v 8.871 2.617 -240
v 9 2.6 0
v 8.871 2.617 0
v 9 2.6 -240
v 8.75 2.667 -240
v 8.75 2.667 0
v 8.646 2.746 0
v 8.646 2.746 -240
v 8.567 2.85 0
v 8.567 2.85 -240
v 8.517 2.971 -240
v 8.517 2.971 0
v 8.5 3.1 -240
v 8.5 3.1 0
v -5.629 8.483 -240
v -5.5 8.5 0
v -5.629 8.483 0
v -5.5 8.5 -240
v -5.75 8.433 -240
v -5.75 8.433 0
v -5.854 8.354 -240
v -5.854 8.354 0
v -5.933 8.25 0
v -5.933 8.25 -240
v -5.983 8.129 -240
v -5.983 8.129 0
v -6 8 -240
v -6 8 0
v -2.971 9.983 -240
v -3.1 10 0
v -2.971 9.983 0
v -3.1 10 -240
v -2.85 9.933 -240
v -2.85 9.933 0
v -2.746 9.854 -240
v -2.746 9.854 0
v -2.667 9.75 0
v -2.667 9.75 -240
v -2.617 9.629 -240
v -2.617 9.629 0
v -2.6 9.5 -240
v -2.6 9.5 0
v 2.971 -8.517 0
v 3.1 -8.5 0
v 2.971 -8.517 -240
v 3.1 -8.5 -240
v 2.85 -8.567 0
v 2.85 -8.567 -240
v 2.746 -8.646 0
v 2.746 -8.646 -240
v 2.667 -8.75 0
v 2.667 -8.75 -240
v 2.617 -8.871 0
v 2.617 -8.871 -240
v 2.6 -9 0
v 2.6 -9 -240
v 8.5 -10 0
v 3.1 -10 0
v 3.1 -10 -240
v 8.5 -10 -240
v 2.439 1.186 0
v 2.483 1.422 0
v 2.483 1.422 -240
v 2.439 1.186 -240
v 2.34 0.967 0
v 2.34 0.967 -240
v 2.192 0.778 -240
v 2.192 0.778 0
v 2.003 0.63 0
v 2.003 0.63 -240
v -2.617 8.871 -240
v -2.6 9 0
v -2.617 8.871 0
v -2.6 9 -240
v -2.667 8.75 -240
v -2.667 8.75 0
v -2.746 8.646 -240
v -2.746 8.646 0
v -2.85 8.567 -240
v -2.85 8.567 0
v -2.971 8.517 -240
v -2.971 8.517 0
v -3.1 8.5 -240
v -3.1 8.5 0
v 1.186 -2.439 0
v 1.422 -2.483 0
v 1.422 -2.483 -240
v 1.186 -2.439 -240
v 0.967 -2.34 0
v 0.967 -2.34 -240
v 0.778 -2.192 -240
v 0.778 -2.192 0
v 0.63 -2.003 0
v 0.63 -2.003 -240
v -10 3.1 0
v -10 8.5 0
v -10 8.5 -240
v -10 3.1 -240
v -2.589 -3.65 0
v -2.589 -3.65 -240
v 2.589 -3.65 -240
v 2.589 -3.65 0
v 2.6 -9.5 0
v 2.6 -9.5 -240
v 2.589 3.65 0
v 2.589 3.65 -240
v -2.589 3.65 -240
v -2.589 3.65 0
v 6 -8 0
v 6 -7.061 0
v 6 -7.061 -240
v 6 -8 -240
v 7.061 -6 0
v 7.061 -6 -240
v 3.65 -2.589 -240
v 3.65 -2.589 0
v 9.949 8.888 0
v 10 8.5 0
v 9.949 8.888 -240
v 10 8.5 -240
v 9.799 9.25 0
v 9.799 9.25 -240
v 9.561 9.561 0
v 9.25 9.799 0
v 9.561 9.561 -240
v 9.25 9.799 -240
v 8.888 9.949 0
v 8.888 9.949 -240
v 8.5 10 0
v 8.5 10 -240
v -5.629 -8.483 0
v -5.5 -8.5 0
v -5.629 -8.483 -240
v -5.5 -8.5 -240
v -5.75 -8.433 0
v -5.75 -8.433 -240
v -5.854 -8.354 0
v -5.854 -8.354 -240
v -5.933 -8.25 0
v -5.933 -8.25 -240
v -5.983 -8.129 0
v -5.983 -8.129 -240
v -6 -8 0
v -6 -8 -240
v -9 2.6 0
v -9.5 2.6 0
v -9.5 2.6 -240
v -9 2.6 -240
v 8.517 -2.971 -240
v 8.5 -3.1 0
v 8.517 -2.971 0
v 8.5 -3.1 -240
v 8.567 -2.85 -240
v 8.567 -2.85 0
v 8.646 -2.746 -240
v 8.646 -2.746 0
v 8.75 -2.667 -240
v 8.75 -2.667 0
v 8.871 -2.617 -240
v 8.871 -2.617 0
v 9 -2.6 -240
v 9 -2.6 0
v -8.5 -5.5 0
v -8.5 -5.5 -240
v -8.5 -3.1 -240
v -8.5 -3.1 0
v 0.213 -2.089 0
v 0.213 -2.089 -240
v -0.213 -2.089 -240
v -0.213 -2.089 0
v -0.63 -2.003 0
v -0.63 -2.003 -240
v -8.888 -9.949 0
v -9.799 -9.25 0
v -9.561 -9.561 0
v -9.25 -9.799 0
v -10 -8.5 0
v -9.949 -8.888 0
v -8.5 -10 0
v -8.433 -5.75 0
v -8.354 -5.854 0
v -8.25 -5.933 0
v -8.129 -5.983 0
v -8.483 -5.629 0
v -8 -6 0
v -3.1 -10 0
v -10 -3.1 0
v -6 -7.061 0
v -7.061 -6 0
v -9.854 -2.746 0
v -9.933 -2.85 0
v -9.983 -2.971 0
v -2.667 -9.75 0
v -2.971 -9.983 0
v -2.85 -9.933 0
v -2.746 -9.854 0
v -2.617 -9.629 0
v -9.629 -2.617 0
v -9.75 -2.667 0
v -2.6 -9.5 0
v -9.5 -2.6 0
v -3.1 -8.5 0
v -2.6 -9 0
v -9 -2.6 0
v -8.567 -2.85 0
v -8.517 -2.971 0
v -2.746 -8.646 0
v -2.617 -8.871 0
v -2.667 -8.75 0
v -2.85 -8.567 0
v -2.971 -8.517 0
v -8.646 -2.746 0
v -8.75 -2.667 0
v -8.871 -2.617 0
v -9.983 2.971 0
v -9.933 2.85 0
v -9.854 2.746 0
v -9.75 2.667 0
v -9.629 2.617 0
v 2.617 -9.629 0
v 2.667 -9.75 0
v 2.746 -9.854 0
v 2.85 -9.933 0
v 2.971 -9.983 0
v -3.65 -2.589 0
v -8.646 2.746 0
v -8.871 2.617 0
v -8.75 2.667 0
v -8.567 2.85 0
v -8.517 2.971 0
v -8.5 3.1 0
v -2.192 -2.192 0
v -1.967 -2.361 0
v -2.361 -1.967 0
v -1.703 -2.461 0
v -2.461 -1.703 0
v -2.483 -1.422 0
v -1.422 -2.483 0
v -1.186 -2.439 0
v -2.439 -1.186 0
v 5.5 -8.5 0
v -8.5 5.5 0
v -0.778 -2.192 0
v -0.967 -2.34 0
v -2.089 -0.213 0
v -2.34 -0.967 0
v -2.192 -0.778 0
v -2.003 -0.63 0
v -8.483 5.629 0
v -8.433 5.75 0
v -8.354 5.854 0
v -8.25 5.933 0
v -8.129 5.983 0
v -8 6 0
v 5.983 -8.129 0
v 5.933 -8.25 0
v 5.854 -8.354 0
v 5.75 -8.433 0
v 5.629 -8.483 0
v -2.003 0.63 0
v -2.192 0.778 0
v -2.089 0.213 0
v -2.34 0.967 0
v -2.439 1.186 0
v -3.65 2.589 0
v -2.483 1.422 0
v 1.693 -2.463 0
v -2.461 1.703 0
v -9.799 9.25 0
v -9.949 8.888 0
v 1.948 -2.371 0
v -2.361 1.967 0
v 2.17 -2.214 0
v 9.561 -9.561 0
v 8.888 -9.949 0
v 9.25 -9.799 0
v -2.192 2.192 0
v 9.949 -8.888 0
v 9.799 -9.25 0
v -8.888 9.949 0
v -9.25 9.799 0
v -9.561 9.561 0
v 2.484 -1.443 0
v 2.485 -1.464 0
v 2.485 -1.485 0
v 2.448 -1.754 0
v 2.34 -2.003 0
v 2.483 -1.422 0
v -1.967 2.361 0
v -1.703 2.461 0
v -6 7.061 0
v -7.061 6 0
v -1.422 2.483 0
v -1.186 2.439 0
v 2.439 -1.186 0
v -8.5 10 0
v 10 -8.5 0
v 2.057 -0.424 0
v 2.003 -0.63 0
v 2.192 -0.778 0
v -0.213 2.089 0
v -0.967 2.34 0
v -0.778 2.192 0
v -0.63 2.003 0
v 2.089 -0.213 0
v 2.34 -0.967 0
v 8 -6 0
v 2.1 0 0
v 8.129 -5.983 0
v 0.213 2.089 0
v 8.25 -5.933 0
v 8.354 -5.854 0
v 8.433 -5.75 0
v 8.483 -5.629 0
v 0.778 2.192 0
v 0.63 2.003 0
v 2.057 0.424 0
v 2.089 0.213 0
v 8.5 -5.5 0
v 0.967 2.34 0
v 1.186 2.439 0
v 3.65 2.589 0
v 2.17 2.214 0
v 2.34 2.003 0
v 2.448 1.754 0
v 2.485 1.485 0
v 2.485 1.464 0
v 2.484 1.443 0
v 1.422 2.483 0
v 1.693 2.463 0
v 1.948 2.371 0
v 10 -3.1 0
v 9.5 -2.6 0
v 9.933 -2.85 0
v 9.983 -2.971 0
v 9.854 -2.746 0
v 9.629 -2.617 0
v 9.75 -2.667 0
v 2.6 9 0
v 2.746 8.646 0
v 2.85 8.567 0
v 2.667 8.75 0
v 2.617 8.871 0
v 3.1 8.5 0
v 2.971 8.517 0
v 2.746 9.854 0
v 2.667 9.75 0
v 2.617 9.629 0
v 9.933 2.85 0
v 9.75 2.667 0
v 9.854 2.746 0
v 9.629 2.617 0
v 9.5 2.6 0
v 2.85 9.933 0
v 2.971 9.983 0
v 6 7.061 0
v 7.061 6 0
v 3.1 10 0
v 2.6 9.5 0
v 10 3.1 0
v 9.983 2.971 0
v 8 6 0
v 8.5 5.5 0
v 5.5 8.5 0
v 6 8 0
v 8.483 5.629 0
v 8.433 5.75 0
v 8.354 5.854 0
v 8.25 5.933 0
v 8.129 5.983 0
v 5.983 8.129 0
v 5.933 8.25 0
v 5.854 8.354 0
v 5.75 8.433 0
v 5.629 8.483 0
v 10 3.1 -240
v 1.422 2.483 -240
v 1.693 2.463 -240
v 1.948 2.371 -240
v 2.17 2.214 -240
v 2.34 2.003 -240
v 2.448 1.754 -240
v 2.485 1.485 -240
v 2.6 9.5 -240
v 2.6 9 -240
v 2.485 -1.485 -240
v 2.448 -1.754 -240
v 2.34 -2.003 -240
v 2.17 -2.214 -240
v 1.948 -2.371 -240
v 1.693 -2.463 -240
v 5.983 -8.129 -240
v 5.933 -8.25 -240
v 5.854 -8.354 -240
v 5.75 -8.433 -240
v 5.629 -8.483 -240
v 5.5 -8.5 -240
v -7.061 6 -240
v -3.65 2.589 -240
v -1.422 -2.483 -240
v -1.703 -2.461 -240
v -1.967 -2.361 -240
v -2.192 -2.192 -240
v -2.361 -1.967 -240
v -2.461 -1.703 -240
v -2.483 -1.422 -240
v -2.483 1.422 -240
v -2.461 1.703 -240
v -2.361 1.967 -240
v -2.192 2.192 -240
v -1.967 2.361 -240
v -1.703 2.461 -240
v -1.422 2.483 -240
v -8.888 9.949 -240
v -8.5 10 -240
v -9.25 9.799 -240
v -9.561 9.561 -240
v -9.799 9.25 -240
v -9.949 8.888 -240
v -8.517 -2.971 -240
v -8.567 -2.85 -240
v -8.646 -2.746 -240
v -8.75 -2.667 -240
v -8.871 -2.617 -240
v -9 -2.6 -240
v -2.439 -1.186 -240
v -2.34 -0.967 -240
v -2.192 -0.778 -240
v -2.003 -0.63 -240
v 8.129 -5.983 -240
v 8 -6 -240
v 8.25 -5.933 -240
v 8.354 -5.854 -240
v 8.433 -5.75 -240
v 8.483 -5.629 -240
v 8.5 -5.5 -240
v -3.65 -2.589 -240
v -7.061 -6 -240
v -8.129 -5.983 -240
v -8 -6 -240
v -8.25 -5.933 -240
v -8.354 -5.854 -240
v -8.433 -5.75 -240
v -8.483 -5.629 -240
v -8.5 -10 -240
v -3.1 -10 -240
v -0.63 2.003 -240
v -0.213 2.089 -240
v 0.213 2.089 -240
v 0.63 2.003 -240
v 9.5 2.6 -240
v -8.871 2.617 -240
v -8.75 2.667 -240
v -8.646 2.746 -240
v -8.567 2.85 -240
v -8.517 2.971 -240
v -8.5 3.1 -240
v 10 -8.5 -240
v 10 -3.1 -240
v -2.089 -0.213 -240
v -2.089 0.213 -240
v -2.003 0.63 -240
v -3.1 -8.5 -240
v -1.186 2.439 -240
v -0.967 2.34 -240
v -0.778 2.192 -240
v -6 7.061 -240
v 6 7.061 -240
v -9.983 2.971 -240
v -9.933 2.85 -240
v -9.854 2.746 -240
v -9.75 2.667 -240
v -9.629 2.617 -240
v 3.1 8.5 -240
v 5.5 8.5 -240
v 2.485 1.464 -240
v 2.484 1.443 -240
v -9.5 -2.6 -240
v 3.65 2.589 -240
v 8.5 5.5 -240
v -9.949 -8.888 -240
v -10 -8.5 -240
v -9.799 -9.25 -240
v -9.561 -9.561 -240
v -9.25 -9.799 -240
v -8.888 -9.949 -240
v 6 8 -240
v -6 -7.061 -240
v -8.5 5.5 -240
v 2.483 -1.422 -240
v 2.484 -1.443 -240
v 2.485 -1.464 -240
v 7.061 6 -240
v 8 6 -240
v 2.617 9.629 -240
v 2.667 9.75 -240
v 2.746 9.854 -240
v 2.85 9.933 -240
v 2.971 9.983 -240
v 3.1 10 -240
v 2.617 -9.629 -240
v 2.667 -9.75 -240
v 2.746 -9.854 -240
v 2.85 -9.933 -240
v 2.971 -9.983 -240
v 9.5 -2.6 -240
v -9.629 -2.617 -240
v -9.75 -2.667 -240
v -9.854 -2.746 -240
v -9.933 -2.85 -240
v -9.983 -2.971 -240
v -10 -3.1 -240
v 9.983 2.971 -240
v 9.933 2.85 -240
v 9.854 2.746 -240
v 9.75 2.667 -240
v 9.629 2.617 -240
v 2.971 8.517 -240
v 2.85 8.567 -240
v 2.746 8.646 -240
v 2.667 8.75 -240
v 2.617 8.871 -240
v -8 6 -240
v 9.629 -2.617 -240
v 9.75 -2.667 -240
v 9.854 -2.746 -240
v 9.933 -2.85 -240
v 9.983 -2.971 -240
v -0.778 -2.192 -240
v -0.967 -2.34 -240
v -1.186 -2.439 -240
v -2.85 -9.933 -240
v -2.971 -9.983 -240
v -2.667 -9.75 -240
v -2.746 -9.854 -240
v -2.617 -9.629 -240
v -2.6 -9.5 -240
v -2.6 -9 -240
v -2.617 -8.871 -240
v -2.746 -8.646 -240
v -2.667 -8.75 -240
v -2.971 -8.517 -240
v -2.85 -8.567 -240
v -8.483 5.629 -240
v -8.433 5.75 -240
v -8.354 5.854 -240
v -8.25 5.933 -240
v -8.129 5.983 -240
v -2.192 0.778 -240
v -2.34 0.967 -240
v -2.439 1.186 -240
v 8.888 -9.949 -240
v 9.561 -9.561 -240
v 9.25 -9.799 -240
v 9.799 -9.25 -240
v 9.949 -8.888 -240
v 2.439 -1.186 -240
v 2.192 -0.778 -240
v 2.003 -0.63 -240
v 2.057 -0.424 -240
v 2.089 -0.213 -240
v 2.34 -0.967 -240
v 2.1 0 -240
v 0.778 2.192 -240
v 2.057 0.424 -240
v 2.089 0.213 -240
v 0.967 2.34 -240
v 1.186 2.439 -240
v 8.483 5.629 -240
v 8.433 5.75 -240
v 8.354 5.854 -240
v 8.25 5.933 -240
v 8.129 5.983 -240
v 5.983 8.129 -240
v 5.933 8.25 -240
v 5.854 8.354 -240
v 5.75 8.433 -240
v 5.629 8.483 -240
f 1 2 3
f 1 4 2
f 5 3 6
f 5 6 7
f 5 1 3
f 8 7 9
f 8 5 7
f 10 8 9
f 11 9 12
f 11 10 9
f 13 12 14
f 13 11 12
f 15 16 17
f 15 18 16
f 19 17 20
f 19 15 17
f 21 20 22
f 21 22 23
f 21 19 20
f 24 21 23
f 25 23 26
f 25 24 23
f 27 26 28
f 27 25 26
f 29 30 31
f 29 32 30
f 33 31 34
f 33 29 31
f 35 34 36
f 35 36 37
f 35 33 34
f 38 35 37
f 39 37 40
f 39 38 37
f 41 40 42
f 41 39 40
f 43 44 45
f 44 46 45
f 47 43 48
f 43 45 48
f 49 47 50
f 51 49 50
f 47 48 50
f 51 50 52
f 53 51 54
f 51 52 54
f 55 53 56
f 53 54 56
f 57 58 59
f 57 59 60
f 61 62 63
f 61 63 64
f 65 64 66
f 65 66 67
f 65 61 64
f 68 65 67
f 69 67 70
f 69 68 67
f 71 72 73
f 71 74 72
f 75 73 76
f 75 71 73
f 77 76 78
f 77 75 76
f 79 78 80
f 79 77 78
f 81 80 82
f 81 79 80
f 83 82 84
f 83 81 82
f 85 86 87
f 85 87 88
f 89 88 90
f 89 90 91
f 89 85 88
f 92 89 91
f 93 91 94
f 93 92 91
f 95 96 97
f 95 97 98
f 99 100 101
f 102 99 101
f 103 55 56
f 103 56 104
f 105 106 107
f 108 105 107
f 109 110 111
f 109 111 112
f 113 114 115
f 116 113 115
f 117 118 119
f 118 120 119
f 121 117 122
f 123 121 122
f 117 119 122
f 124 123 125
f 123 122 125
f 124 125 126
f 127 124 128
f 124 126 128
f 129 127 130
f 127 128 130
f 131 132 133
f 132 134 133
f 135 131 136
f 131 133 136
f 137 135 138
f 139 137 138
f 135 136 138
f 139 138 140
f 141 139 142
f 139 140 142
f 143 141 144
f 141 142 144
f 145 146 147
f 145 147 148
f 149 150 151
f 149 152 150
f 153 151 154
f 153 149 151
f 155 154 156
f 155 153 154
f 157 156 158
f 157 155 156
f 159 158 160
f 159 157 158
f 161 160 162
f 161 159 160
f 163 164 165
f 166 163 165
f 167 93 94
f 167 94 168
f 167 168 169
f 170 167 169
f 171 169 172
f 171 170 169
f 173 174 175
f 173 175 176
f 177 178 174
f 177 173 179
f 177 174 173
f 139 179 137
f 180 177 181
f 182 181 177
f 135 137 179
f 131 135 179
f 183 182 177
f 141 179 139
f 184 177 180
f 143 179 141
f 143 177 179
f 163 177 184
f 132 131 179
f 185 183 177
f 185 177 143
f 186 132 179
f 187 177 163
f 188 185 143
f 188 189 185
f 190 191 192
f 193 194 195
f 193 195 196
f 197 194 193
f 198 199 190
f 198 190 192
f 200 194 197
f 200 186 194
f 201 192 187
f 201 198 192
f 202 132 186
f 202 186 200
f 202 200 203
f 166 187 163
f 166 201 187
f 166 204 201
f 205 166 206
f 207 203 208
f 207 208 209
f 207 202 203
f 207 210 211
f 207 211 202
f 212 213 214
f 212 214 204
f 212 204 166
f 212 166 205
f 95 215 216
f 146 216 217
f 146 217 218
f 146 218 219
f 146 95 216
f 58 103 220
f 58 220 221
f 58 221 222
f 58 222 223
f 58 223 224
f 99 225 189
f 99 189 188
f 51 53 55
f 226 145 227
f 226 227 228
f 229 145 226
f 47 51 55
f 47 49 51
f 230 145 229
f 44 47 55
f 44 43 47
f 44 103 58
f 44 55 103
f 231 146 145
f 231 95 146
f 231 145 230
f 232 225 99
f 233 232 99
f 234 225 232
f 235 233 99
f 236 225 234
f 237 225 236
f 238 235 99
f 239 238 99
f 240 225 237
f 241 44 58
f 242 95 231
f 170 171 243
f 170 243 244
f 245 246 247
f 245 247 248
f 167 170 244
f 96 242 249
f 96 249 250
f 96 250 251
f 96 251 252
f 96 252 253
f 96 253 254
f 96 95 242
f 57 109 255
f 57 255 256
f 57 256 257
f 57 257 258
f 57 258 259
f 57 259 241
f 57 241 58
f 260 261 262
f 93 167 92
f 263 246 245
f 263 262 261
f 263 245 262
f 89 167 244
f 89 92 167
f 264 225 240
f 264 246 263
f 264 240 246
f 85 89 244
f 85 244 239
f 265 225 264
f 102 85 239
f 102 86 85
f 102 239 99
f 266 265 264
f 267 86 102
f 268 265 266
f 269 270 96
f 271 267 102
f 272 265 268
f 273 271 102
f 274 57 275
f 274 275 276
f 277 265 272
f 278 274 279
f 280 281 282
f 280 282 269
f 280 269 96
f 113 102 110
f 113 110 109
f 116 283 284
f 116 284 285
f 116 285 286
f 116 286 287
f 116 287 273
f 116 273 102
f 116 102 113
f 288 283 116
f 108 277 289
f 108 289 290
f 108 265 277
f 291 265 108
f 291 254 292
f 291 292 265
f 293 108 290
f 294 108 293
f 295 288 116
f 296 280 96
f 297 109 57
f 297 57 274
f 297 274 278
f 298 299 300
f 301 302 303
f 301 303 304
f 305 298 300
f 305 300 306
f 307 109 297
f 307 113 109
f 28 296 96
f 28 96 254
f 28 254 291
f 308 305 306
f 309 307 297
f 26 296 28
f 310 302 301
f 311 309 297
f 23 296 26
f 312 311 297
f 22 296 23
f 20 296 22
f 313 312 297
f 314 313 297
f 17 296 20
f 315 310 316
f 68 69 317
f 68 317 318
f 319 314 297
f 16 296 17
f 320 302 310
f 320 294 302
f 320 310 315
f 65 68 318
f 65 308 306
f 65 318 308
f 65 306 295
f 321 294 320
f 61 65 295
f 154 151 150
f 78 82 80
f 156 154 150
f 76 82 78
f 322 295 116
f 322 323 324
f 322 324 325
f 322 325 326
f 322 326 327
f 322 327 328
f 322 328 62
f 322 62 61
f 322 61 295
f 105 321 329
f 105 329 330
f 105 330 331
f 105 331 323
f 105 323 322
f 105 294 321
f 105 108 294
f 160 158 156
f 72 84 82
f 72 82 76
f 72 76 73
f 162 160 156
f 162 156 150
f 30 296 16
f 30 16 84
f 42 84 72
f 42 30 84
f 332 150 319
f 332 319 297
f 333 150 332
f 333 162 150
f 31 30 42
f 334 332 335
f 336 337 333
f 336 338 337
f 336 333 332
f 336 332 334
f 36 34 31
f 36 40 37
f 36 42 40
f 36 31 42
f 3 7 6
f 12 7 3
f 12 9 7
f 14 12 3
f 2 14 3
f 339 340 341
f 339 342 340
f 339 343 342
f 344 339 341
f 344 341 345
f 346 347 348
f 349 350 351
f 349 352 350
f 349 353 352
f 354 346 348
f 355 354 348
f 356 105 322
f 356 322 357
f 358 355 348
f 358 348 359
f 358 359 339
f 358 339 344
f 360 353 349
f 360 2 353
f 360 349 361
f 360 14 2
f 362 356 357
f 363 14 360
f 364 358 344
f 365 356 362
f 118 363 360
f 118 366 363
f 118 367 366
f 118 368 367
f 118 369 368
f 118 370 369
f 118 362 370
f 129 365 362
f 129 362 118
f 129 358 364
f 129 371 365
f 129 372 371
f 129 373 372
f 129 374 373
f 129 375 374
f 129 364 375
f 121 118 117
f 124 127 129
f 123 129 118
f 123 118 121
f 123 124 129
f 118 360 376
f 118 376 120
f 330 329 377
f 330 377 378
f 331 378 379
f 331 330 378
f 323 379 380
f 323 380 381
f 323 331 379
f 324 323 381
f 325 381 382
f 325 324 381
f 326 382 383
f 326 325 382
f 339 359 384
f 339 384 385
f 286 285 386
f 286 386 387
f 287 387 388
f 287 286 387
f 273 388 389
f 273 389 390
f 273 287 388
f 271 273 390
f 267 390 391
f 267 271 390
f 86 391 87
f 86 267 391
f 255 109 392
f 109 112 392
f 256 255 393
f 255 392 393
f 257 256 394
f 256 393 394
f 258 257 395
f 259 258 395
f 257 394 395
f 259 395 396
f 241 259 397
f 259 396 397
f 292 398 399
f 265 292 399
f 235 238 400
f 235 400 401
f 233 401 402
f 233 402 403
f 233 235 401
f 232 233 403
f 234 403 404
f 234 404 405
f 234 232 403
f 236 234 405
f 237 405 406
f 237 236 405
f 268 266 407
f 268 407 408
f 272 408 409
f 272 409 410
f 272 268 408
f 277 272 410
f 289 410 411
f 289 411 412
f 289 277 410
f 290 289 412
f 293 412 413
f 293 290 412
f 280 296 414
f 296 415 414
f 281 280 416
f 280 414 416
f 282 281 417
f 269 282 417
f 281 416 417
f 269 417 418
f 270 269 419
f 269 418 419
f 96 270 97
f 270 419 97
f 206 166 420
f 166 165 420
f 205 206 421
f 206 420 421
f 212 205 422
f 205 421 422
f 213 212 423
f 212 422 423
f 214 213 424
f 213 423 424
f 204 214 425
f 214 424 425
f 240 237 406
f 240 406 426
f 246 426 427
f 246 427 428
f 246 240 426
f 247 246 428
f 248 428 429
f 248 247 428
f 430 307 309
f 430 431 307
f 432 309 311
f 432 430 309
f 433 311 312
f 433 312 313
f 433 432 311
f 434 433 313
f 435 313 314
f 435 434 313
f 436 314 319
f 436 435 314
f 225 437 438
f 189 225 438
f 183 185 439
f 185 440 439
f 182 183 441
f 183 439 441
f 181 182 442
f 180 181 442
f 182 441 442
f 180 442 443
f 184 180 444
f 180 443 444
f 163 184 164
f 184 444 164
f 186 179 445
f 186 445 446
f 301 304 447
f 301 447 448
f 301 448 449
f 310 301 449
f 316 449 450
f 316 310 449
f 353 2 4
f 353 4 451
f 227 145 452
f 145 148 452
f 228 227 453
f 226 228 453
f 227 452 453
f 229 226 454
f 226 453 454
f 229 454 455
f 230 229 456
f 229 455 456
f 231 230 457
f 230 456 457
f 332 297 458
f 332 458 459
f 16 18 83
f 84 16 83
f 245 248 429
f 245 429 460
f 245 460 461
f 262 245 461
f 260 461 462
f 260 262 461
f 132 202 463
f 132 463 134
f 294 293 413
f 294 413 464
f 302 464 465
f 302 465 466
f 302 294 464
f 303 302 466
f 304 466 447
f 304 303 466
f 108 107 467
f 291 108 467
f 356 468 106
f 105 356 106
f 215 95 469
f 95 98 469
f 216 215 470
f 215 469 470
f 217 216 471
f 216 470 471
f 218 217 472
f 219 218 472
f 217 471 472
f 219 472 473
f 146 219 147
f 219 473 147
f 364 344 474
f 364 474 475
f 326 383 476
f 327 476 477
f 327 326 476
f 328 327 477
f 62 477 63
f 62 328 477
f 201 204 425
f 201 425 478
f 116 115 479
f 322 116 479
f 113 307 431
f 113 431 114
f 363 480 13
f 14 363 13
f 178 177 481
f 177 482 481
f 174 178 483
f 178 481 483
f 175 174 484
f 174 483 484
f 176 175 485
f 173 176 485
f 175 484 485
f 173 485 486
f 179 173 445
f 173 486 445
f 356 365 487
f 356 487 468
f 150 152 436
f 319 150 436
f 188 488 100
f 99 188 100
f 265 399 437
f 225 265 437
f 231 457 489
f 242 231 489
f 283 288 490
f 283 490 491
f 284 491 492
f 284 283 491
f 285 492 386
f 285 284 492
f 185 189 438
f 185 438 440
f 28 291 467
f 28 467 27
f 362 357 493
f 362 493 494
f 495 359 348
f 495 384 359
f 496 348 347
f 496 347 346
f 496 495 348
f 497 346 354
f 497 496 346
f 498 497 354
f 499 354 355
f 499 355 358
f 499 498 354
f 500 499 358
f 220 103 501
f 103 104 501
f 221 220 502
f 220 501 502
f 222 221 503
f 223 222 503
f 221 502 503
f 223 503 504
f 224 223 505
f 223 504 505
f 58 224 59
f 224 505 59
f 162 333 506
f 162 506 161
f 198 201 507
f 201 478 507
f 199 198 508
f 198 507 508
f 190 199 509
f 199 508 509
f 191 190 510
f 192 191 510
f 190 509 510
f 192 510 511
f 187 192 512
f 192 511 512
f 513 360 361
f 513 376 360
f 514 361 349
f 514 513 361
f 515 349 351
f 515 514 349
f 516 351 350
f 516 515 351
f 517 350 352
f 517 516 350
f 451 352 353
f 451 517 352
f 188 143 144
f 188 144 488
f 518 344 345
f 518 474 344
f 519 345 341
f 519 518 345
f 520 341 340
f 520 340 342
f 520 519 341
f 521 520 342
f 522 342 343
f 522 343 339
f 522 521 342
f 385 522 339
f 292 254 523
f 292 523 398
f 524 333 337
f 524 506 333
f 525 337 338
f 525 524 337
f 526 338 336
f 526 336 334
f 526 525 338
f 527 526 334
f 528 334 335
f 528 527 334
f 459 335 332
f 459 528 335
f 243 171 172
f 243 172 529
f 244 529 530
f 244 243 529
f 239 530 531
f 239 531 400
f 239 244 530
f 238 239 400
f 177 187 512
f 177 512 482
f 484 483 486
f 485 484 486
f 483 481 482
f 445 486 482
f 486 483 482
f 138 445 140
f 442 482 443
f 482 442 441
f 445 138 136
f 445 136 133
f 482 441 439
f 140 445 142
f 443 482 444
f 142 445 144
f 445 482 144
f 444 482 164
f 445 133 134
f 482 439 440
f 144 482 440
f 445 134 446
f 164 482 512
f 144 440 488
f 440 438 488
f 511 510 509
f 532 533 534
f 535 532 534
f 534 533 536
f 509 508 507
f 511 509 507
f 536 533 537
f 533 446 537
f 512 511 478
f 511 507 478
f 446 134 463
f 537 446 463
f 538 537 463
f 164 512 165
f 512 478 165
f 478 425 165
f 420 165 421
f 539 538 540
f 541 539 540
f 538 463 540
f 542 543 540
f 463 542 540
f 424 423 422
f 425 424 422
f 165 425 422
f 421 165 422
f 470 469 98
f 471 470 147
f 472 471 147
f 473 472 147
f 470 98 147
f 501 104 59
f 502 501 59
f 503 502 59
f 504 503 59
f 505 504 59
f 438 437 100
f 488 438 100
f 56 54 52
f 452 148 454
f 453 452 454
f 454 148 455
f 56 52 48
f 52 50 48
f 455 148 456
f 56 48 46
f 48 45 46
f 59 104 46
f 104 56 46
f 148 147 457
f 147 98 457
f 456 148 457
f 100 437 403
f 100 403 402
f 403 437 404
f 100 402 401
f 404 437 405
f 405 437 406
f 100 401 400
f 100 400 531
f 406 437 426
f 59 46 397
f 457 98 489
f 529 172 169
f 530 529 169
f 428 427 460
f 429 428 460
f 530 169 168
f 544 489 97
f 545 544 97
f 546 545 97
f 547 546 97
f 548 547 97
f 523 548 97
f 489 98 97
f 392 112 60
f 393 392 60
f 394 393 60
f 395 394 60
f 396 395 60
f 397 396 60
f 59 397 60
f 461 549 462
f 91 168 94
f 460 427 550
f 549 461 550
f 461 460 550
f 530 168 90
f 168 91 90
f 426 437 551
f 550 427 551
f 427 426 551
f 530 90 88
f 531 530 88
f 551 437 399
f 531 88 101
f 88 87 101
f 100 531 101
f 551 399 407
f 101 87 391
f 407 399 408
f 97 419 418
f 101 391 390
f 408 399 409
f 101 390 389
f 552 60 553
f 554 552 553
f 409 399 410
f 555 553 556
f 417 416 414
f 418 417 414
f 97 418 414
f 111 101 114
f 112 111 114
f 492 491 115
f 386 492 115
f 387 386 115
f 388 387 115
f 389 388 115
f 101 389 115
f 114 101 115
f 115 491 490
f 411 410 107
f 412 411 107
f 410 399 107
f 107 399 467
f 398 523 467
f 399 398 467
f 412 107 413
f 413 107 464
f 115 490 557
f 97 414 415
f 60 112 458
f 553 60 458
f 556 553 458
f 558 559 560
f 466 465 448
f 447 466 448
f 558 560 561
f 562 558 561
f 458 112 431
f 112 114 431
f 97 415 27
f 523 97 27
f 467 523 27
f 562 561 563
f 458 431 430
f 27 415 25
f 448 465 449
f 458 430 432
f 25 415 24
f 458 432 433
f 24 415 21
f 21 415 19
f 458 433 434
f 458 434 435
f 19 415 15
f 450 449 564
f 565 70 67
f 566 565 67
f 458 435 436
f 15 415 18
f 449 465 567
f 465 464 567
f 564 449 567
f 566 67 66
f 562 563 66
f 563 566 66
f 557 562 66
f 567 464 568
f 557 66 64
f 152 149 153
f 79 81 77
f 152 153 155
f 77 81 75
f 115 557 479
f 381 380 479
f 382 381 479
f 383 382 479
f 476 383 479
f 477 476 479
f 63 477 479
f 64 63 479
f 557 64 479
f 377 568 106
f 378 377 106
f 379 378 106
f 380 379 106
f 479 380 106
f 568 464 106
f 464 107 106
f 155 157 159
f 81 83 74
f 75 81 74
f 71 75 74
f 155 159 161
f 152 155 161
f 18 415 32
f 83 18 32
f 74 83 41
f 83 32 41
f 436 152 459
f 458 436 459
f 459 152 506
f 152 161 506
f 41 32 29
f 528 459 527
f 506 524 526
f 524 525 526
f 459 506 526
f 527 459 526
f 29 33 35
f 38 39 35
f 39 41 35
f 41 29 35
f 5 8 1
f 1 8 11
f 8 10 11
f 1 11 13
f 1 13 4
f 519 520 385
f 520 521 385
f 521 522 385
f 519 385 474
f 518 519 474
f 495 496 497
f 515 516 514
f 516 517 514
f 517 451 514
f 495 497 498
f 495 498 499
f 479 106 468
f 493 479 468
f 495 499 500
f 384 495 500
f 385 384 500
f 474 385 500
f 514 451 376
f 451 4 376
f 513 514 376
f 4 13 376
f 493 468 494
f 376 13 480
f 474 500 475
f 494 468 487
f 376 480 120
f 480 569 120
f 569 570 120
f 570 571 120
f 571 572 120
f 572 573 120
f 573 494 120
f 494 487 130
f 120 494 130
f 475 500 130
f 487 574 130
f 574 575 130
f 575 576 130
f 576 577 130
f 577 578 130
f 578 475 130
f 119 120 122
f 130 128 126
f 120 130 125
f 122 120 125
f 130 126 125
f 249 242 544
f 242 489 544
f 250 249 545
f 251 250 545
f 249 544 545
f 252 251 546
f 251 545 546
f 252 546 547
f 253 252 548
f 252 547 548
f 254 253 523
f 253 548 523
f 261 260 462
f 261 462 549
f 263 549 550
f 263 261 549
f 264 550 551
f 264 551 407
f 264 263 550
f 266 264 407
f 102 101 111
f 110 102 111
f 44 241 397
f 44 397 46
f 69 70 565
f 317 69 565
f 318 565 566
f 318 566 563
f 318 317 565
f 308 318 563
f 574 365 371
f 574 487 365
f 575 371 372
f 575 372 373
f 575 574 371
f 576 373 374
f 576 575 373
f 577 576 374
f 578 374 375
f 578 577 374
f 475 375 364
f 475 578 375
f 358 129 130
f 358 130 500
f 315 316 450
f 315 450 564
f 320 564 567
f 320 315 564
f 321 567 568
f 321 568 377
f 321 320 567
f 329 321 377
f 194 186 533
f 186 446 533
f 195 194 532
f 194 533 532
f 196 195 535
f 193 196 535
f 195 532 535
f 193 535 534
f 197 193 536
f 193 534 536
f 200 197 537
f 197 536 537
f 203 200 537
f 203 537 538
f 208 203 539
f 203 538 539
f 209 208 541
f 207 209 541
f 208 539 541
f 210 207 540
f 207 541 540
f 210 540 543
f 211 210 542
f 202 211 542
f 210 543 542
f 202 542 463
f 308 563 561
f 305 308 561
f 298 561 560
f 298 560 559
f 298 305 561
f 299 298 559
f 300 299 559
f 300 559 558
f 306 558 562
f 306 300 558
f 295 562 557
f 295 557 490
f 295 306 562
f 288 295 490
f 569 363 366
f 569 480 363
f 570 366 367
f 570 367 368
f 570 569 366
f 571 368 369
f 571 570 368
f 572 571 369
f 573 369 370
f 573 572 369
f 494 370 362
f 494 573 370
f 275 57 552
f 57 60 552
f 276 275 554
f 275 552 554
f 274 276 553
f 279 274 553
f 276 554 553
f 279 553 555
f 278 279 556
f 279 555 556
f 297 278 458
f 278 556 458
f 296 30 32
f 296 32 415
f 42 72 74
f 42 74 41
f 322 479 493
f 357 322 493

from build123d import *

# Parameters (mm, degrees)
F1_DEPTH = 240
F2_R     = 1.5
F3_R     = 0.5


with BuildPart() as f1:
    # F0 (on Top) → F1 (new body)
    with BuildSketch(Plane.XY):
        Polygon((-2.6, 8.5), (-2.6, 10), (-10, 10), (-10, 2.6), (-8.5, 2.6), (-8.5, 6), (-8.5, 7.4393398282), (-8.5, 8.5), (-7.4393398282, 8.5), (-6, 8.5), align=None)
        Polygon((-8.5, 7.4393398282), (-8.5, 6), (-7.0606601718, 6), align=None)
        Polygon((-6, 7.0606601718), (-6, 8.5), (-7.4393398282, 8.5), align=None)
        Polygon((-6, 7.0606601718), (-7.4393398282, 8.5), (-8.5, 8.5), (-8.5, 7.4393398282), (-7.0606601718, 6), (-3.65, 2.5893398282), (-3.65, 3.65), (-2.5893398282, 3.65), align=None)
        Polygon((10, 2.6), (10, 10), (2.6, 10), (2.6, 8.5), (6, 8.5), (7.4393398282, 8.5), (8.5, 8.5), (8.5, 7.4393398282), (8.5, 6), (8.5, 2.6), align=None)
        Polygon((7.4393398282, 8.5), (6, 8.5), (6, 7.0606601718), align=None)
        Polygon((8.5, 8.5), (7.4393398282, 8.5), (6, 7.0606601718), (2.5893398282, 3.65), (3.65, 3.65), (3.65, 2.5893398282), (7.0606601718, 6), (8.5, 7.4393398282), align=None)
        Polygon((7.0606601718, 6), (8.5, 6), (8.5, 7.4393398282), align=None)
        Polygon((6, -7.0606601718), (6, -8.5), (7.4393398282, -8.5), align=None)
        Polygon((8.5, -8.5), (8.5, -7.4393398282), (7.0606601718, -6), (3.65, -2.5893398282), (3.65, -3.65), (2.5893398282, -3.65), (6, -7.0606601718), (7.4393398282, -8.5), align=None)
        Polygon((8.5, -7.4393398282), (8.5, -6), (7.0606601718, -6), align=None)
        Polygon((10, -10), (10, -2.6), (8.5, -2.6), (8.5, -6), (8.5, -7.4393398282), (8.5, -8.5), (7.4393398282, -8.5), (6, -8.5), (2.6, -8.5), (2.6, -10), align=None)
        Polygon((-8.5, -2.6), (-10, -2.6), (-10, -10), (-2.6, -10), (-2.6, -8.5), (-6, -8.5), (-7.4393398282, -8.5), (-8.5, -8.5), (-8.5, -7.4393398282), (-8.5, -6), align=None)
        Polygon((-7.4393398282, -8.5), (-6, -8.5), (-6, -7.0606601718), align=None)
        Polygon((-7.0606601718, -6), (-8.5, -6), (-8.5, -7.4393398282), align=None)
        Polygon((-7.0606601718, -6), (-8.5, -7.4393398282), (-8.5, -8.5), (-7.4393398282, -8.5), (-6, -7.0606601718), (-2.5893398282, -3.65), (-3.65, -3.65), (-3.65, -2.5893398282), align=None)
        with BuildLine():
            Line((-2.4829614997, -1.4223013279), (-3.65, -2.5893398282))
            Line((-3.65, -2.5893398282), (-3.65, -3.65))
            Line((-3.65, -3.65), (-2.5893398282, -3.65))
            Line((-2.5893398282, -3.65), (-1.4223013279, -2.4829614997))
            ThreePointArc((-1.4223013279, -2.4829614997), (-2.1920310217, -2.1920310217), (-2.4829614997, -1.4223013279))
        make_face()
        with BuildLine():
            Line((-2.5893398282, -3.65), (2.5893398282, -3.65))
            Line((2.5893398282, -3.65), (1.4223013279, -2.4829614997))
            ThreePointArc((1.4223013279, -2.4829614997), (0.9671620585, -2.3404488298), (0.6297938115, -2.0033371546))
            ThreePointArc((0.6297938115, -2.0033371546), (0, -2.1), (-0.6297938115, -2.0033371546))
            ThreePointArc((-0.6297938115, -2.0033371546), (-0.9671620585, -2.3404488298), (-1.4223013279, -2.4829614997))
            Line((-1.4223013279, -2.4829614997), (-2.5893398282, -3.65))
        make_face()
        with BuildLine():
            Line((3.65, -3.65), (3.65, -2.5893398282))
            Line((3.65, -2.5893398282), (2.4829614997, -1.4223013279))
            ThreePointArc((2.4829614997, -1.4223013279), (2.4844334349, -1.4535974088), (2.4849242405, -1.4849242405))
            ThreePointArc((2.4849242405, -1.4849242405), (2.1695325546, -2.2138353848), (1.4223013279, -2.4829614997))
            Line((1.4223013279, -2.4829614997), (2.5893398282, -3.65))
            Line((2.5893398282, -3.65), (3.65, -3.65))
        make_face()
        with BuildLine():
            Line((3.65, -2.5893398282), (3.65, 2.5893398282))
            Line((3.65, 2.5893398282), (2.4829614997, 1.4223013279))
            ThreePointArc((2.4829614997, 1.4223013279), (2.3404488298, 0.9671620585), (2.0033371546, 0.6297938115))
            ThreePointArc((2.0033371546, 0.6297938115), (2.075693622, 0.3185843494), (2.1, 0))
            ThreePointArc((2.1, 0), (2.075693622, -0.3185843494), (2.0033371546, -0.6297938115))
            ThreePointArc((2.0033371546, -0.6297938115), (2.3404488298, -0.9671620585), (2.4829614997, -1.4223013279))
            Line((2.4829614997, -1.4223013279), (3.65, -2.5893398282))
        make_face()
        with BuildLine():
            Line((3.65, 3.65), (2.5893398282, 3.65))
            Line((2.5893398282, 3.65), (1.4223013279, 2.4829614997))
            ThreePointArc((1.4223013279, 2.4829614997), (2.1695325546, 2.2138353848), (2.4849242405, 1.4849242405))
            ThreePointArc((2.4849242405, 1.4849242405), (2.4844334349, 1.4535974088), (2.4829614997, 1.4223013279))
            Line((2.4829614997, 1.4223013279), (3.65, 2.5893398282))
            Line((3.65, 2.5893398282), (3.65, 3.65))
        make_face()
        with BuildLine():
            Line((1.4223013279, 2.4829614997), (2.5893398282, 3.65))
            Line((2.5893398282, 3.65), (-2.5893398282, 3.65))
            Line((-2.5893398282, 3.65), (-1.4223013279, 2.4829614997))
            ThreePointArc((-1.4223013279, 2.4829614997), (-0.9671620585, 2.3404488298), (-0.6297938115, 2.0033371546))
            ThreePointArc((-0.6297938115, 2.0033371546), (0, 2.1), (0.6297938115, 2.0033371546))
            ThreePointArc((0.6297938115, 2.0033371546), (0.9671620585, 2.3404488298), (1.4223013279, 2.4829614997))
        make_face()
        with BuildLine():
            Line((-1.4223013279, 2.4829614997), (-2.5893398282, 3.65))
            Line((-2.5893398282, 3.65), (-3.65, 3.65))
            Line((-3.65, 3.65), (-3.65, 2.5893398282))
            Line((-3.65, 2.5893398282), (-2.4829614997, 1.4223013279))
            ThreePointArc((-2.4829614997, 1.4223013279), (-2.1920310217, 2.1920310217), (-1.4223013279, 2.4829614997))
        make_face()
        with BuildLine():
            Line((-2.4829614997, 1.4223013279), (-3.65, 2.5893398282))
            Line((-3.65, 2.5893398282), (-3.65, -2.5893398282))
            Line((-3.65, -2.5893398282), (-2.4829614997, -1.4223013279))
            ThreePointArc((-2.4829614997, -1.4223013279), (-2.3404488298, -0.9671620585), (-2.0033371546, -0.6297938115))
            ThreePointArc((-2.0033371546, -0.6297938115), (-2.1, 0), (-2.0033371546, 0.6297938115))
            ThreePointArc((-2.0033371546, 0.6297938115), (-2.3404488298, 0.9671620585), (-2.4829614997, 1.4223013279))
        make_face()
    extrude(amount=-F1_DEPTH)

    # F2
    f2_edges = [f1.edges().sort_by_distance(p)[0] for p in [
        (-10, -10, -120),
        (-10, 10, -120),
        (10, -10, -120),
        (10, 10, -120),
    ]]
    fillet(f2_edges, radius=F2_R)

    # F3
    f3_edges = [f1.edges().sort_by_distance(p)[0] for p in [
        (-6, -8.5, -120),
        (-8.5, -6, -120),
        (-8.5, 6, -120),
        (-6, 8.5, -120),
        (6, -8.5, -120),
        (8.5, -6, -120),
        (8.5, 6, -120),
        (6, 8.5, -120),
        (-2.6, 10, -120),
        (-2.6, 8.5, -120),
        (2.6, 10, -120),
        (-8.5, 2.6, -120),
        (-8.5, -2.6, -120),
        (-10, -2.6, -120),
        (-2.6, -8.5, -120),
        (-2.6, -10, -120),
        (2.6, -8.5, -120),
        (8.5, -2.6, -120),
        (10, -2.6, -120),
        (10, 2.6, -120),
        (8.5, 2.6, -120),
        (2.6, 8.5, -120),
        (-10, 2.6, -120),
        (2.6, -10, -120),
    ]]
    fillet(f3_edges, radius=F3_R)


solid = f1.part
